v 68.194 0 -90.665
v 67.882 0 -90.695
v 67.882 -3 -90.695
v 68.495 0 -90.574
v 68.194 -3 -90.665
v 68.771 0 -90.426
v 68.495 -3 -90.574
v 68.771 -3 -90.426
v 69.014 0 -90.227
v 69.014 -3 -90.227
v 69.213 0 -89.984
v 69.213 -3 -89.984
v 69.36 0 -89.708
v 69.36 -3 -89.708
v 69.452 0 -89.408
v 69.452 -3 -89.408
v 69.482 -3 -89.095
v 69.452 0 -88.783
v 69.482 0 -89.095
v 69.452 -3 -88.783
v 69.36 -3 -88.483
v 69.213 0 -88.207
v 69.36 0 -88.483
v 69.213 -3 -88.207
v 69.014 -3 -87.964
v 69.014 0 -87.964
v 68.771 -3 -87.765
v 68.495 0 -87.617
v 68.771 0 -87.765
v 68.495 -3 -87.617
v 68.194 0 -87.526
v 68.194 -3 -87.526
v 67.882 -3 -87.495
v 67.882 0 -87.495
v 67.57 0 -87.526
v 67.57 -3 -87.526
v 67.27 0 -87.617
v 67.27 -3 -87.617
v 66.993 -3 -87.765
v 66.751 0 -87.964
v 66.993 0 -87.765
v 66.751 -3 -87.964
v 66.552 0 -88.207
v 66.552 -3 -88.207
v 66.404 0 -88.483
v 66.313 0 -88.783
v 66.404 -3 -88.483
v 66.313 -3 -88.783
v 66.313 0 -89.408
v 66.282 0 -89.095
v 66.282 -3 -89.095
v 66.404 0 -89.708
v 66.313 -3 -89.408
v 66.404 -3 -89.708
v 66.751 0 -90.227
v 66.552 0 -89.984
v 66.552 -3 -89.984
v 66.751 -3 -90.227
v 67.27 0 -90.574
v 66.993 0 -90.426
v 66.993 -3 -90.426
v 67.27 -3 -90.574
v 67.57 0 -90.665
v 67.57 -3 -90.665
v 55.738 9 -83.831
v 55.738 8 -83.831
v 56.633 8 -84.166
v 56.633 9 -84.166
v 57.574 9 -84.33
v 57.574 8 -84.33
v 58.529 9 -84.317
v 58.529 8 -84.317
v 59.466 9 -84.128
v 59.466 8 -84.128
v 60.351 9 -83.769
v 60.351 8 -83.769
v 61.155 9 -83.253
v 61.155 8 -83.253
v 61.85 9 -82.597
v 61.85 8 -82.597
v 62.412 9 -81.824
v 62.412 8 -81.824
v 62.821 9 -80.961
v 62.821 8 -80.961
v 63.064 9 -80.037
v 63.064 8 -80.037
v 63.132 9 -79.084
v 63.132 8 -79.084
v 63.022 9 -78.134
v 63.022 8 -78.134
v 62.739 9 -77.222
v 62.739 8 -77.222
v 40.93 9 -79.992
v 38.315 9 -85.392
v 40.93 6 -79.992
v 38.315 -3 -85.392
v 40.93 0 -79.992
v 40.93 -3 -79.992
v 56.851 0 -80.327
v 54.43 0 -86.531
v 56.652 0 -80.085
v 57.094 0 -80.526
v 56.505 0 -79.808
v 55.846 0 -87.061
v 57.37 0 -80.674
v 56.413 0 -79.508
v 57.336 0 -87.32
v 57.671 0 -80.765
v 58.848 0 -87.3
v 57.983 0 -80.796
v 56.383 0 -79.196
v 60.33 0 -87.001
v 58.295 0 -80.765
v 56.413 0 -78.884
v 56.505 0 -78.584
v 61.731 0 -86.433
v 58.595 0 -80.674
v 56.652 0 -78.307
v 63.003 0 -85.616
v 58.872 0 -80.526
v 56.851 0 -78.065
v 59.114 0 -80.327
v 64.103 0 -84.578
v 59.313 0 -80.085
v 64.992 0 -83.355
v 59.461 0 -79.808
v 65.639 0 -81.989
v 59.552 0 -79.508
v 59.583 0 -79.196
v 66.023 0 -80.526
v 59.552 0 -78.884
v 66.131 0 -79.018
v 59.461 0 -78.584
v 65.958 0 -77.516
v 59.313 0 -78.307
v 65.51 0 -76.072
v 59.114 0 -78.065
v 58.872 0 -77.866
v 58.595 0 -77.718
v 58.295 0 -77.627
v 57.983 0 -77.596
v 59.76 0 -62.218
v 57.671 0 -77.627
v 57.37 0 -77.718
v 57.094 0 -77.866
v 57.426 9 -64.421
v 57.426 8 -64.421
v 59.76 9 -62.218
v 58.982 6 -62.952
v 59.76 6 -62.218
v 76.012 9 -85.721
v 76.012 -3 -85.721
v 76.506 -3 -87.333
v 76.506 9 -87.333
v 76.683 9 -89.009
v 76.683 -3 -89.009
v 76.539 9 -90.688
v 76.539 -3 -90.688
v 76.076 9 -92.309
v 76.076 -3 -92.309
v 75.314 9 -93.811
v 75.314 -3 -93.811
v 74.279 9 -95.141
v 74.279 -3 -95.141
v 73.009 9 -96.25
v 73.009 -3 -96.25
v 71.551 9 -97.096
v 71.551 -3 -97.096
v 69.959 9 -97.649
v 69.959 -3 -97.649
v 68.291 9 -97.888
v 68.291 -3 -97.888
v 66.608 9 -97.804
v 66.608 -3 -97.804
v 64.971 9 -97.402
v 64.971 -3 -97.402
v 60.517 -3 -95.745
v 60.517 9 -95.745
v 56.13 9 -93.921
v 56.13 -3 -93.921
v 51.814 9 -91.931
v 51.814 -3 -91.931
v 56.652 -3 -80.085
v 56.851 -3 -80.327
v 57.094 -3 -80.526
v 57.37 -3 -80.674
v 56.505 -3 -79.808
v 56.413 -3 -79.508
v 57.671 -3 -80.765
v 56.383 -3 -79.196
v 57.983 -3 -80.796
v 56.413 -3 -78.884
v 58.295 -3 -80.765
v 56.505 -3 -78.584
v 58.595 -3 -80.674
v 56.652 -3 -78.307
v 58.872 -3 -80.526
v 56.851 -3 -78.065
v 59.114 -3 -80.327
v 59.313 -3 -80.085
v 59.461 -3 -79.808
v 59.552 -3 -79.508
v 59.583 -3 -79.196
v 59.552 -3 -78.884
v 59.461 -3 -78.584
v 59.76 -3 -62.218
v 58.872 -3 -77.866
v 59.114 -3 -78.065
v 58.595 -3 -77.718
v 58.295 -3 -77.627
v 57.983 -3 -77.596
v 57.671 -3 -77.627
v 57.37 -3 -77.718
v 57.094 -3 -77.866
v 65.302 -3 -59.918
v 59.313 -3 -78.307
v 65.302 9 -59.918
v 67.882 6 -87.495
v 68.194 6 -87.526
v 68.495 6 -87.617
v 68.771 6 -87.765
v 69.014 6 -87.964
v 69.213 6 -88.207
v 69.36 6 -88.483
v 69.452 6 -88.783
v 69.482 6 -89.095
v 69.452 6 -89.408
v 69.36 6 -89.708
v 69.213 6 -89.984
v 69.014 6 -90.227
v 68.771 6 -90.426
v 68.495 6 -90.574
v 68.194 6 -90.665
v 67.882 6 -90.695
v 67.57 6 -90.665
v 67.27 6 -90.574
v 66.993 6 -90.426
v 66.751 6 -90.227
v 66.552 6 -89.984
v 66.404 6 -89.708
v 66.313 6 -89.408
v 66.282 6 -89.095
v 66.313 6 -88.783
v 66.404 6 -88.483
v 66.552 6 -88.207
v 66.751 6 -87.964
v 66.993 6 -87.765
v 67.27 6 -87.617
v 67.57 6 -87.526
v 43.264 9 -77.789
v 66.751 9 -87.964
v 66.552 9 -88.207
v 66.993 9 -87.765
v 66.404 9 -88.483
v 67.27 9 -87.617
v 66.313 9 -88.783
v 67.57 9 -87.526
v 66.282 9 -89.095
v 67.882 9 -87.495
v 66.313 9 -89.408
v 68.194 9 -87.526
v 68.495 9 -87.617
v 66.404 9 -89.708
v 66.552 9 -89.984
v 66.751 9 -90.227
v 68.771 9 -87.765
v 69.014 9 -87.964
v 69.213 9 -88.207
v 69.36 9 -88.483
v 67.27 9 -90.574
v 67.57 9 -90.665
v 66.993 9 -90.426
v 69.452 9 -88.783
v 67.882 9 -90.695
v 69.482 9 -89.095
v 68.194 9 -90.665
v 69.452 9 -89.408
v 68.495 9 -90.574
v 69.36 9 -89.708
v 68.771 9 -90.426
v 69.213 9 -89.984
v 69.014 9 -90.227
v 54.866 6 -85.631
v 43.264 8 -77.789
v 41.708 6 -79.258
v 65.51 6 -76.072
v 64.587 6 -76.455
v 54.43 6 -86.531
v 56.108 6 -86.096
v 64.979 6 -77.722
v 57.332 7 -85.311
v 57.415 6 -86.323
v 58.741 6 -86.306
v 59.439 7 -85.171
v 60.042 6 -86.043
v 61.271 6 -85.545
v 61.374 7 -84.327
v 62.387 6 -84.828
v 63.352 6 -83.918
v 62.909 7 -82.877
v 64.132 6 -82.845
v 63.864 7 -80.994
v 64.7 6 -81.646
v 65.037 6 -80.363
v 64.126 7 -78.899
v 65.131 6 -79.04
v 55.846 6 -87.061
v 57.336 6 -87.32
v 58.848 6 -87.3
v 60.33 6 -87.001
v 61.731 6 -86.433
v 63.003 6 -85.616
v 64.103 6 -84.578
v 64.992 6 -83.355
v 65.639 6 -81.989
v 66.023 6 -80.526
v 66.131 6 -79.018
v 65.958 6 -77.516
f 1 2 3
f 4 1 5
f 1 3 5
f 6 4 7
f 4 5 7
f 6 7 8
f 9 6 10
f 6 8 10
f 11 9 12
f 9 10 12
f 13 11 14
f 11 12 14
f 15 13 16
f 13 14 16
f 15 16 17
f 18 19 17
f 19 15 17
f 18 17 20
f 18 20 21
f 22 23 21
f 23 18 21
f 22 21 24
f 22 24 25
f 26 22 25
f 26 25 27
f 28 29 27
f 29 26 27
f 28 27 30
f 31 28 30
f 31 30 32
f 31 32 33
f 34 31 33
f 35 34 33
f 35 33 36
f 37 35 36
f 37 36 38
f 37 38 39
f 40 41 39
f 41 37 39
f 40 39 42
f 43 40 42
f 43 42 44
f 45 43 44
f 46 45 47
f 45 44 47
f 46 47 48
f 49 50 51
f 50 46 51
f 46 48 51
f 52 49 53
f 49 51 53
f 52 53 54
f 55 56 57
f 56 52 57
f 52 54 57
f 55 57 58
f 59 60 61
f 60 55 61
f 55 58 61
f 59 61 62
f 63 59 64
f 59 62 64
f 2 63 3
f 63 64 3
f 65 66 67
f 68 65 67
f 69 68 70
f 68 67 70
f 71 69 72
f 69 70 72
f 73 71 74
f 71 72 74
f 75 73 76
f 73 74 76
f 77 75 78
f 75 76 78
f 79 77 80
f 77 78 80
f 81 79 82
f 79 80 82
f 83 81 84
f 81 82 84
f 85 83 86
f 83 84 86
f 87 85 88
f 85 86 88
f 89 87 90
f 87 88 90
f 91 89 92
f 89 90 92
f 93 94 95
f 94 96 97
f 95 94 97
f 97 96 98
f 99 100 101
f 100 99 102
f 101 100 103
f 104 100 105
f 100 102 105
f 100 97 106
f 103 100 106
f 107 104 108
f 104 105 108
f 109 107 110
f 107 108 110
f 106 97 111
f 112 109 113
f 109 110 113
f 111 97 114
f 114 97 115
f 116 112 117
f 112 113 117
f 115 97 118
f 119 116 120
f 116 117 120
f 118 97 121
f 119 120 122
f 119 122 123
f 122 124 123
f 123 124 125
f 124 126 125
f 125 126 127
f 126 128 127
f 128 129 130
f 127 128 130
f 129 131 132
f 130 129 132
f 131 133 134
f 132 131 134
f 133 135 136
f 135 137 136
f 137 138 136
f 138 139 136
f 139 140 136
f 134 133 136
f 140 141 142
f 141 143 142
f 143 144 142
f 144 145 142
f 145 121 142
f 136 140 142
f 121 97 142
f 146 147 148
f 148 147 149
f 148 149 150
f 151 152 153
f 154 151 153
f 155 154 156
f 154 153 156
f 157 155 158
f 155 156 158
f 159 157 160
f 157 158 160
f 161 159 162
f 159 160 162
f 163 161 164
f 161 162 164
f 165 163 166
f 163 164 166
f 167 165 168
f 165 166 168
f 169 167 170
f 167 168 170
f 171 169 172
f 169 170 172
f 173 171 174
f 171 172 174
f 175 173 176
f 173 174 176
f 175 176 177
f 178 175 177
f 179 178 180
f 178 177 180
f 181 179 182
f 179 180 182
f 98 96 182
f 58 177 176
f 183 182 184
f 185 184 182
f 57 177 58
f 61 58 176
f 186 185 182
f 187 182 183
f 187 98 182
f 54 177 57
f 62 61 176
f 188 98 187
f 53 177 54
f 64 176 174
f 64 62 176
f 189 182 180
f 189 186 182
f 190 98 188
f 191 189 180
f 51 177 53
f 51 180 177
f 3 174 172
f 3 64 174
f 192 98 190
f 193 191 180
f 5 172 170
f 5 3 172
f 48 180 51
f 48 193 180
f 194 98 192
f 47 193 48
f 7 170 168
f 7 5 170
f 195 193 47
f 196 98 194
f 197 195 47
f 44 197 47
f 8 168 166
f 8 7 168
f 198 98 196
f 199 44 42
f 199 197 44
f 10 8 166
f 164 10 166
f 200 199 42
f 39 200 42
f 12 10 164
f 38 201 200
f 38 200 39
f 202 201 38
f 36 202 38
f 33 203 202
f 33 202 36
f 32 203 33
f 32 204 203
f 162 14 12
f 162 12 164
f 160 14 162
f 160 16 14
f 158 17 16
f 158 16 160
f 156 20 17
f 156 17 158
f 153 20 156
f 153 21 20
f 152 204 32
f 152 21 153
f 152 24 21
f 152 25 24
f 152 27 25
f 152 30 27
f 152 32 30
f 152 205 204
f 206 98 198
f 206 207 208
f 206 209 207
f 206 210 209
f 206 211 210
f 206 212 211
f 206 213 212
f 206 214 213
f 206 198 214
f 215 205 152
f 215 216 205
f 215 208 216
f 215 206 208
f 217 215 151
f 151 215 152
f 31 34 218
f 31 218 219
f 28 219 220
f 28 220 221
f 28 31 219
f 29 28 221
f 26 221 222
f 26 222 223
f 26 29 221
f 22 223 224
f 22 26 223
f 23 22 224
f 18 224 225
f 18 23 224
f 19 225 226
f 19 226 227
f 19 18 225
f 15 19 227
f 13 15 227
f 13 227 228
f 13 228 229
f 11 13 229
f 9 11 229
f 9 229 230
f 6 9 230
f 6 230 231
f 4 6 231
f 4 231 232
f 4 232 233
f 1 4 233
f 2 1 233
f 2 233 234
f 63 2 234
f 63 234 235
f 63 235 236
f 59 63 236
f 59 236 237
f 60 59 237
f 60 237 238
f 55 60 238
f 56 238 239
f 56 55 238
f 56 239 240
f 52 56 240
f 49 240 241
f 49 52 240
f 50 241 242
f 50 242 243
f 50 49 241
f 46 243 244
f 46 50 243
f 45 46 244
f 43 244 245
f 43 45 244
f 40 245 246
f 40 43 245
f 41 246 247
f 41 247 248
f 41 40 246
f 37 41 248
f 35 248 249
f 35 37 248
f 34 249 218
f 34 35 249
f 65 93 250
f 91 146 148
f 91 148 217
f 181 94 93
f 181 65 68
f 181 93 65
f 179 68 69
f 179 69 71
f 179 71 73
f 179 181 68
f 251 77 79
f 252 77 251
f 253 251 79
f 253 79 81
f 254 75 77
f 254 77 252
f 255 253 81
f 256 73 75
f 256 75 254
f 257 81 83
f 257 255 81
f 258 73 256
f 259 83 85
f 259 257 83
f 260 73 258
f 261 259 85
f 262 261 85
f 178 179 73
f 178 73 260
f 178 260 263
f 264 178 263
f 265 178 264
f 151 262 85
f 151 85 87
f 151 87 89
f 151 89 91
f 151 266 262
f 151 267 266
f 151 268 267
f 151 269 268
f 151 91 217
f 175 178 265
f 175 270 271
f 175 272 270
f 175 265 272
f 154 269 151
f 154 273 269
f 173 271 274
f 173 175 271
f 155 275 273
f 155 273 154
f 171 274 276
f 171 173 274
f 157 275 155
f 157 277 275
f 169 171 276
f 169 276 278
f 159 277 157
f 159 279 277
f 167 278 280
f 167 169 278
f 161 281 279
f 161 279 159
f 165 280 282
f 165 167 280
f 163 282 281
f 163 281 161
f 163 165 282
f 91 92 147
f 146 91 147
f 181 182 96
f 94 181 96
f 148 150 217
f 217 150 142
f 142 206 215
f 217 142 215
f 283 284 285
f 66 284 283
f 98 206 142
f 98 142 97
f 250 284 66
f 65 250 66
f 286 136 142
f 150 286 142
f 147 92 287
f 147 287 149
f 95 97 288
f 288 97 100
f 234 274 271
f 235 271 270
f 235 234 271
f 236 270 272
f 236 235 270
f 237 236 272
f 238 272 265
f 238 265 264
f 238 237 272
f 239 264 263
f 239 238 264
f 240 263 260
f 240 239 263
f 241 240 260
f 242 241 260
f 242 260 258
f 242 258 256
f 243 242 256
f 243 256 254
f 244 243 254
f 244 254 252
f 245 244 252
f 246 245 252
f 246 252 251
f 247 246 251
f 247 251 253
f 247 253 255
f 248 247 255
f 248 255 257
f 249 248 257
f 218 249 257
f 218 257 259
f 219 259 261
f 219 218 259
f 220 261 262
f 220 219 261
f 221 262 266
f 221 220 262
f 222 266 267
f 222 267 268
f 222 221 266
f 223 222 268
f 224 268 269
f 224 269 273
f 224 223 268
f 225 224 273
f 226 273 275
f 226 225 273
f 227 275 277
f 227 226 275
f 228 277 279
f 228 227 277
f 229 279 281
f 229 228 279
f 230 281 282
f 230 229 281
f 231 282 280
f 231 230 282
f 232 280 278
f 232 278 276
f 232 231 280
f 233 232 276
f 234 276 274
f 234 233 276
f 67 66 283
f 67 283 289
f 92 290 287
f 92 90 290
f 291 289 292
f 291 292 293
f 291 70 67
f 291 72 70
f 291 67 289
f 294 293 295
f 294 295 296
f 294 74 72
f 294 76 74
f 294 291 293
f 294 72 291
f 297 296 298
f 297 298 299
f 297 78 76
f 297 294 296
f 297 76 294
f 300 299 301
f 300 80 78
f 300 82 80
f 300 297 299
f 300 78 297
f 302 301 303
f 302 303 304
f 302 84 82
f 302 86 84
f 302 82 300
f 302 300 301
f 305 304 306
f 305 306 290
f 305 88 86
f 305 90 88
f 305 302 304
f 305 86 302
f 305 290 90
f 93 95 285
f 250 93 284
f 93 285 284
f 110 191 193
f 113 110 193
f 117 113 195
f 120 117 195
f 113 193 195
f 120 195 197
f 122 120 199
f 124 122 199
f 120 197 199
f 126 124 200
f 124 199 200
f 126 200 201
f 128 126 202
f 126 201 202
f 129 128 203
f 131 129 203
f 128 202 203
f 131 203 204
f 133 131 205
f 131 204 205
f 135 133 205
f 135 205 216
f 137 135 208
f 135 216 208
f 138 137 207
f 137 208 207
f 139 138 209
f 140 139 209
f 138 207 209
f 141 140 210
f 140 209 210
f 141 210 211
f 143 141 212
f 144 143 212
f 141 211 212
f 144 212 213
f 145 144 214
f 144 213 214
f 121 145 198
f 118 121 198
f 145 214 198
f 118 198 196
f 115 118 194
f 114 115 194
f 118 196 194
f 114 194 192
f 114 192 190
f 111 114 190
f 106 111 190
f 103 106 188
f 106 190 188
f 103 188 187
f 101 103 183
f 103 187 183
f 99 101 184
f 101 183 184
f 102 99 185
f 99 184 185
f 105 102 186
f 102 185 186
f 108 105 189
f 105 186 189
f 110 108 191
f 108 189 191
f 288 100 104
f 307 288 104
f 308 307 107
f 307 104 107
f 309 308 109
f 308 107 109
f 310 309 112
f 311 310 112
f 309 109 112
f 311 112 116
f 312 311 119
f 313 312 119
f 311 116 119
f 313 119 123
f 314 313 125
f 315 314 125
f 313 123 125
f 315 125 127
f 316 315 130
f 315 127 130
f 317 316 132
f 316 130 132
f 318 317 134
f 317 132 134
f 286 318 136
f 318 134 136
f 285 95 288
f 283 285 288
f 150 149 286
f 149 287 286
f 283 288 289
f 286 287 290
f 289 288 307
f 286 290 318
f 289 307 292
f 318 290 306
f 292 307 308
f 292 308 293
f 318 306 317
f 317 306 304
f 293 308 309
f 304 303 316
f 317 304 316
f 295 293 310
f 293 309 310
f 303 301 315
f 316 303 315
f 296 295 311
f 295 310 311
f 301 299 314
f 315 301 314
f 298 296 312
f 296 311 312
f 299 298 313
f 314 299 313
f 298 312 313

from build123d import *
from build123d.topology import SkipClean

# Parameters (mm, degrees)
SKETCH1_R           = 1.6
BOSS_EXTRUDE1_DEPTH = 6
BOSS_EXTRUDE3_START = 3
SKETCH7_R           = 1.6
BOSS_EXTRUDE3_DEPTH = 3
SKETCH8_R           = 1.6
BOSS_EXTRUDE4_DEPTH = 3
CHAMFER1_SIZE       = 2


with BuildPart() as part:
    # Sketch1 → Boss-Extrude1 (new body)
    with BuildSketch(Plane(origin=(0, 0, 0), x_dir=(1, 0, 0), z_dir=(0, 1, 0))):
        with BuildLine():
            Line((40.930223616, 79.991972891), (54.42997891, 86.530826536))
            ThreePointArc((54.42997891, 86.530826536), (63.577181794, 85.122585909), (65.51014962, 76.071724202))
            Line((65.51014962, 76.071724202), (59.760023318, 62.21762562))
            Line((59.760023318, 62.21762562), (65.30166275, 59.917575099))
            Line((65.30166275, 59.917575099), (76.011513854, 85.721414039))
            ThreePointArc((76.011513854, 85.721414039), (74.278699447, 95.141487045), (64.97108226, 97.401726747))
            ThreePointArc((64.97108226, 97.401726747), (58.314802122, 94.853700296), (51.814437452, 91.930728654))
            Line((51.814437452, 91.930728654), (38.314682158, 85.391875009))
            Line((38.314682158, 85.391875009), (40.930223616, 79.991972891))
        make_face()
        with Locations(Location((67.882250994, 89.09545443, 0), (0, 0, 270))):
            Circle(SKETCH1_R, mode=Mode.SUBTRACT)
    extrude(amount=BOSS_EXTRUDE1_DEPTH)

    # Sketch7 → Boss-Extrude3 (add)
    with SkipClean():  # the faces are left unmerged after this step: merging them gives an invalid solid
        with BuildSketch(Plane.XZ.offset(BOSS_EXTRUDE3_START)):
            with BuildLine():
                Line((76.011513854, -85.721414039), (65.30166275, -59.917575099))
                Line((65.30166275, -59.917575099), (59.760023318, -62.21762562))
                Line((59.760023318, -62.21762562), (40.930223616, -79.991972891))
                Line((40.930223616, -79.991972891), (38.314682158, -85.391875009))
                Line((38.314682158, -85.391875009), (51.814437452, -91.930728654))
                ThreePointArc((51.814437452, -91.930728654), (58.314802122, -94.853700296), (64.97108226, -97.401726747))
                ThreePointArc((64.97108226, -97.401726747), (74.278699447, -95.141487045), (76.011513854, -85.721414039))
            make_face()
            with Locations(Location((67.882250994, -89.09545443, 0), (0, 0, 270))):
                Circle(SKETCH7_R, mode=Mode.SUBTRACT)
            with Locations(Location((57.982756057, -79.195959493, 0), (0, 0, 270))):
                Circle(SKETCH7_R, mode=Mode.SUBTRACT)
        extrude(amount=-BOSS_EXTRUDE3_DEPTH)

    # Sketch8 → Boss-Extrude4 (add)
    with BuildSketch(Plane(origin=(0, 6, 0), x_dir=(1, 0, 0), z_dir=(0, 1, 0))):
        with BuildLine():
            Line((38.314682158, 85.391875009), (40.930223616, 79.991972891))
            Line((40.930223616, 79.991972891), (43.264016412, 77.788994406))
            Line((43.264016412, 77.788994406), (55.737749639, 83.830875477))
            ThreePointArc((55.737749639, 83.830875477), (61.517883977, 82.941005633), (62.739329904, 77.221749462))
            Line((62.739329904, 77.221749462), (57.426230521, 64.420604105))
            Line((57.426230521, 64.420604105), (59.760023318, 62.21762562))
            Line((59.760023318, 62.21762562), (65.30166275, 59.917575099))
            Line((65.30166275, 59.917575099), (76.011513854, 85.721414039))
            ThreePointArc((76.011513854, 85.721414039), (74.278699447, 95.141487045), (64.97108226, 97.401726747))
            ThreePointArc((64.97108226, 97.401726747), (58.314802122, 94.853700296), (51.814437452, 91.930728654))
            Line((51.814437452, 91.930728654), (38.314682158, 85.391875009))
        make_face()
        with Locations(Location((67.882250994, 89.09545443, 0), (0, 0, 90))):
            Circle(SKETCH8_R, mode=Mode.SUBTRACT)
    extrude(amount=BOSS_EXTRUDE4_DEPTH)

    # Chamfer1
    chamfer1_edges = [part.edges().sort_by_distance(p)[0] for p in [
        (49.500883026, 6, -80.809934942),
        (61.517883977, 6, -82.941005633),
        (60.082780212, 6, -70.821176784),
    ]]
    chamfer(chamfer1_edges, length=CHAMFER1_SIZE)


solid = part.part
